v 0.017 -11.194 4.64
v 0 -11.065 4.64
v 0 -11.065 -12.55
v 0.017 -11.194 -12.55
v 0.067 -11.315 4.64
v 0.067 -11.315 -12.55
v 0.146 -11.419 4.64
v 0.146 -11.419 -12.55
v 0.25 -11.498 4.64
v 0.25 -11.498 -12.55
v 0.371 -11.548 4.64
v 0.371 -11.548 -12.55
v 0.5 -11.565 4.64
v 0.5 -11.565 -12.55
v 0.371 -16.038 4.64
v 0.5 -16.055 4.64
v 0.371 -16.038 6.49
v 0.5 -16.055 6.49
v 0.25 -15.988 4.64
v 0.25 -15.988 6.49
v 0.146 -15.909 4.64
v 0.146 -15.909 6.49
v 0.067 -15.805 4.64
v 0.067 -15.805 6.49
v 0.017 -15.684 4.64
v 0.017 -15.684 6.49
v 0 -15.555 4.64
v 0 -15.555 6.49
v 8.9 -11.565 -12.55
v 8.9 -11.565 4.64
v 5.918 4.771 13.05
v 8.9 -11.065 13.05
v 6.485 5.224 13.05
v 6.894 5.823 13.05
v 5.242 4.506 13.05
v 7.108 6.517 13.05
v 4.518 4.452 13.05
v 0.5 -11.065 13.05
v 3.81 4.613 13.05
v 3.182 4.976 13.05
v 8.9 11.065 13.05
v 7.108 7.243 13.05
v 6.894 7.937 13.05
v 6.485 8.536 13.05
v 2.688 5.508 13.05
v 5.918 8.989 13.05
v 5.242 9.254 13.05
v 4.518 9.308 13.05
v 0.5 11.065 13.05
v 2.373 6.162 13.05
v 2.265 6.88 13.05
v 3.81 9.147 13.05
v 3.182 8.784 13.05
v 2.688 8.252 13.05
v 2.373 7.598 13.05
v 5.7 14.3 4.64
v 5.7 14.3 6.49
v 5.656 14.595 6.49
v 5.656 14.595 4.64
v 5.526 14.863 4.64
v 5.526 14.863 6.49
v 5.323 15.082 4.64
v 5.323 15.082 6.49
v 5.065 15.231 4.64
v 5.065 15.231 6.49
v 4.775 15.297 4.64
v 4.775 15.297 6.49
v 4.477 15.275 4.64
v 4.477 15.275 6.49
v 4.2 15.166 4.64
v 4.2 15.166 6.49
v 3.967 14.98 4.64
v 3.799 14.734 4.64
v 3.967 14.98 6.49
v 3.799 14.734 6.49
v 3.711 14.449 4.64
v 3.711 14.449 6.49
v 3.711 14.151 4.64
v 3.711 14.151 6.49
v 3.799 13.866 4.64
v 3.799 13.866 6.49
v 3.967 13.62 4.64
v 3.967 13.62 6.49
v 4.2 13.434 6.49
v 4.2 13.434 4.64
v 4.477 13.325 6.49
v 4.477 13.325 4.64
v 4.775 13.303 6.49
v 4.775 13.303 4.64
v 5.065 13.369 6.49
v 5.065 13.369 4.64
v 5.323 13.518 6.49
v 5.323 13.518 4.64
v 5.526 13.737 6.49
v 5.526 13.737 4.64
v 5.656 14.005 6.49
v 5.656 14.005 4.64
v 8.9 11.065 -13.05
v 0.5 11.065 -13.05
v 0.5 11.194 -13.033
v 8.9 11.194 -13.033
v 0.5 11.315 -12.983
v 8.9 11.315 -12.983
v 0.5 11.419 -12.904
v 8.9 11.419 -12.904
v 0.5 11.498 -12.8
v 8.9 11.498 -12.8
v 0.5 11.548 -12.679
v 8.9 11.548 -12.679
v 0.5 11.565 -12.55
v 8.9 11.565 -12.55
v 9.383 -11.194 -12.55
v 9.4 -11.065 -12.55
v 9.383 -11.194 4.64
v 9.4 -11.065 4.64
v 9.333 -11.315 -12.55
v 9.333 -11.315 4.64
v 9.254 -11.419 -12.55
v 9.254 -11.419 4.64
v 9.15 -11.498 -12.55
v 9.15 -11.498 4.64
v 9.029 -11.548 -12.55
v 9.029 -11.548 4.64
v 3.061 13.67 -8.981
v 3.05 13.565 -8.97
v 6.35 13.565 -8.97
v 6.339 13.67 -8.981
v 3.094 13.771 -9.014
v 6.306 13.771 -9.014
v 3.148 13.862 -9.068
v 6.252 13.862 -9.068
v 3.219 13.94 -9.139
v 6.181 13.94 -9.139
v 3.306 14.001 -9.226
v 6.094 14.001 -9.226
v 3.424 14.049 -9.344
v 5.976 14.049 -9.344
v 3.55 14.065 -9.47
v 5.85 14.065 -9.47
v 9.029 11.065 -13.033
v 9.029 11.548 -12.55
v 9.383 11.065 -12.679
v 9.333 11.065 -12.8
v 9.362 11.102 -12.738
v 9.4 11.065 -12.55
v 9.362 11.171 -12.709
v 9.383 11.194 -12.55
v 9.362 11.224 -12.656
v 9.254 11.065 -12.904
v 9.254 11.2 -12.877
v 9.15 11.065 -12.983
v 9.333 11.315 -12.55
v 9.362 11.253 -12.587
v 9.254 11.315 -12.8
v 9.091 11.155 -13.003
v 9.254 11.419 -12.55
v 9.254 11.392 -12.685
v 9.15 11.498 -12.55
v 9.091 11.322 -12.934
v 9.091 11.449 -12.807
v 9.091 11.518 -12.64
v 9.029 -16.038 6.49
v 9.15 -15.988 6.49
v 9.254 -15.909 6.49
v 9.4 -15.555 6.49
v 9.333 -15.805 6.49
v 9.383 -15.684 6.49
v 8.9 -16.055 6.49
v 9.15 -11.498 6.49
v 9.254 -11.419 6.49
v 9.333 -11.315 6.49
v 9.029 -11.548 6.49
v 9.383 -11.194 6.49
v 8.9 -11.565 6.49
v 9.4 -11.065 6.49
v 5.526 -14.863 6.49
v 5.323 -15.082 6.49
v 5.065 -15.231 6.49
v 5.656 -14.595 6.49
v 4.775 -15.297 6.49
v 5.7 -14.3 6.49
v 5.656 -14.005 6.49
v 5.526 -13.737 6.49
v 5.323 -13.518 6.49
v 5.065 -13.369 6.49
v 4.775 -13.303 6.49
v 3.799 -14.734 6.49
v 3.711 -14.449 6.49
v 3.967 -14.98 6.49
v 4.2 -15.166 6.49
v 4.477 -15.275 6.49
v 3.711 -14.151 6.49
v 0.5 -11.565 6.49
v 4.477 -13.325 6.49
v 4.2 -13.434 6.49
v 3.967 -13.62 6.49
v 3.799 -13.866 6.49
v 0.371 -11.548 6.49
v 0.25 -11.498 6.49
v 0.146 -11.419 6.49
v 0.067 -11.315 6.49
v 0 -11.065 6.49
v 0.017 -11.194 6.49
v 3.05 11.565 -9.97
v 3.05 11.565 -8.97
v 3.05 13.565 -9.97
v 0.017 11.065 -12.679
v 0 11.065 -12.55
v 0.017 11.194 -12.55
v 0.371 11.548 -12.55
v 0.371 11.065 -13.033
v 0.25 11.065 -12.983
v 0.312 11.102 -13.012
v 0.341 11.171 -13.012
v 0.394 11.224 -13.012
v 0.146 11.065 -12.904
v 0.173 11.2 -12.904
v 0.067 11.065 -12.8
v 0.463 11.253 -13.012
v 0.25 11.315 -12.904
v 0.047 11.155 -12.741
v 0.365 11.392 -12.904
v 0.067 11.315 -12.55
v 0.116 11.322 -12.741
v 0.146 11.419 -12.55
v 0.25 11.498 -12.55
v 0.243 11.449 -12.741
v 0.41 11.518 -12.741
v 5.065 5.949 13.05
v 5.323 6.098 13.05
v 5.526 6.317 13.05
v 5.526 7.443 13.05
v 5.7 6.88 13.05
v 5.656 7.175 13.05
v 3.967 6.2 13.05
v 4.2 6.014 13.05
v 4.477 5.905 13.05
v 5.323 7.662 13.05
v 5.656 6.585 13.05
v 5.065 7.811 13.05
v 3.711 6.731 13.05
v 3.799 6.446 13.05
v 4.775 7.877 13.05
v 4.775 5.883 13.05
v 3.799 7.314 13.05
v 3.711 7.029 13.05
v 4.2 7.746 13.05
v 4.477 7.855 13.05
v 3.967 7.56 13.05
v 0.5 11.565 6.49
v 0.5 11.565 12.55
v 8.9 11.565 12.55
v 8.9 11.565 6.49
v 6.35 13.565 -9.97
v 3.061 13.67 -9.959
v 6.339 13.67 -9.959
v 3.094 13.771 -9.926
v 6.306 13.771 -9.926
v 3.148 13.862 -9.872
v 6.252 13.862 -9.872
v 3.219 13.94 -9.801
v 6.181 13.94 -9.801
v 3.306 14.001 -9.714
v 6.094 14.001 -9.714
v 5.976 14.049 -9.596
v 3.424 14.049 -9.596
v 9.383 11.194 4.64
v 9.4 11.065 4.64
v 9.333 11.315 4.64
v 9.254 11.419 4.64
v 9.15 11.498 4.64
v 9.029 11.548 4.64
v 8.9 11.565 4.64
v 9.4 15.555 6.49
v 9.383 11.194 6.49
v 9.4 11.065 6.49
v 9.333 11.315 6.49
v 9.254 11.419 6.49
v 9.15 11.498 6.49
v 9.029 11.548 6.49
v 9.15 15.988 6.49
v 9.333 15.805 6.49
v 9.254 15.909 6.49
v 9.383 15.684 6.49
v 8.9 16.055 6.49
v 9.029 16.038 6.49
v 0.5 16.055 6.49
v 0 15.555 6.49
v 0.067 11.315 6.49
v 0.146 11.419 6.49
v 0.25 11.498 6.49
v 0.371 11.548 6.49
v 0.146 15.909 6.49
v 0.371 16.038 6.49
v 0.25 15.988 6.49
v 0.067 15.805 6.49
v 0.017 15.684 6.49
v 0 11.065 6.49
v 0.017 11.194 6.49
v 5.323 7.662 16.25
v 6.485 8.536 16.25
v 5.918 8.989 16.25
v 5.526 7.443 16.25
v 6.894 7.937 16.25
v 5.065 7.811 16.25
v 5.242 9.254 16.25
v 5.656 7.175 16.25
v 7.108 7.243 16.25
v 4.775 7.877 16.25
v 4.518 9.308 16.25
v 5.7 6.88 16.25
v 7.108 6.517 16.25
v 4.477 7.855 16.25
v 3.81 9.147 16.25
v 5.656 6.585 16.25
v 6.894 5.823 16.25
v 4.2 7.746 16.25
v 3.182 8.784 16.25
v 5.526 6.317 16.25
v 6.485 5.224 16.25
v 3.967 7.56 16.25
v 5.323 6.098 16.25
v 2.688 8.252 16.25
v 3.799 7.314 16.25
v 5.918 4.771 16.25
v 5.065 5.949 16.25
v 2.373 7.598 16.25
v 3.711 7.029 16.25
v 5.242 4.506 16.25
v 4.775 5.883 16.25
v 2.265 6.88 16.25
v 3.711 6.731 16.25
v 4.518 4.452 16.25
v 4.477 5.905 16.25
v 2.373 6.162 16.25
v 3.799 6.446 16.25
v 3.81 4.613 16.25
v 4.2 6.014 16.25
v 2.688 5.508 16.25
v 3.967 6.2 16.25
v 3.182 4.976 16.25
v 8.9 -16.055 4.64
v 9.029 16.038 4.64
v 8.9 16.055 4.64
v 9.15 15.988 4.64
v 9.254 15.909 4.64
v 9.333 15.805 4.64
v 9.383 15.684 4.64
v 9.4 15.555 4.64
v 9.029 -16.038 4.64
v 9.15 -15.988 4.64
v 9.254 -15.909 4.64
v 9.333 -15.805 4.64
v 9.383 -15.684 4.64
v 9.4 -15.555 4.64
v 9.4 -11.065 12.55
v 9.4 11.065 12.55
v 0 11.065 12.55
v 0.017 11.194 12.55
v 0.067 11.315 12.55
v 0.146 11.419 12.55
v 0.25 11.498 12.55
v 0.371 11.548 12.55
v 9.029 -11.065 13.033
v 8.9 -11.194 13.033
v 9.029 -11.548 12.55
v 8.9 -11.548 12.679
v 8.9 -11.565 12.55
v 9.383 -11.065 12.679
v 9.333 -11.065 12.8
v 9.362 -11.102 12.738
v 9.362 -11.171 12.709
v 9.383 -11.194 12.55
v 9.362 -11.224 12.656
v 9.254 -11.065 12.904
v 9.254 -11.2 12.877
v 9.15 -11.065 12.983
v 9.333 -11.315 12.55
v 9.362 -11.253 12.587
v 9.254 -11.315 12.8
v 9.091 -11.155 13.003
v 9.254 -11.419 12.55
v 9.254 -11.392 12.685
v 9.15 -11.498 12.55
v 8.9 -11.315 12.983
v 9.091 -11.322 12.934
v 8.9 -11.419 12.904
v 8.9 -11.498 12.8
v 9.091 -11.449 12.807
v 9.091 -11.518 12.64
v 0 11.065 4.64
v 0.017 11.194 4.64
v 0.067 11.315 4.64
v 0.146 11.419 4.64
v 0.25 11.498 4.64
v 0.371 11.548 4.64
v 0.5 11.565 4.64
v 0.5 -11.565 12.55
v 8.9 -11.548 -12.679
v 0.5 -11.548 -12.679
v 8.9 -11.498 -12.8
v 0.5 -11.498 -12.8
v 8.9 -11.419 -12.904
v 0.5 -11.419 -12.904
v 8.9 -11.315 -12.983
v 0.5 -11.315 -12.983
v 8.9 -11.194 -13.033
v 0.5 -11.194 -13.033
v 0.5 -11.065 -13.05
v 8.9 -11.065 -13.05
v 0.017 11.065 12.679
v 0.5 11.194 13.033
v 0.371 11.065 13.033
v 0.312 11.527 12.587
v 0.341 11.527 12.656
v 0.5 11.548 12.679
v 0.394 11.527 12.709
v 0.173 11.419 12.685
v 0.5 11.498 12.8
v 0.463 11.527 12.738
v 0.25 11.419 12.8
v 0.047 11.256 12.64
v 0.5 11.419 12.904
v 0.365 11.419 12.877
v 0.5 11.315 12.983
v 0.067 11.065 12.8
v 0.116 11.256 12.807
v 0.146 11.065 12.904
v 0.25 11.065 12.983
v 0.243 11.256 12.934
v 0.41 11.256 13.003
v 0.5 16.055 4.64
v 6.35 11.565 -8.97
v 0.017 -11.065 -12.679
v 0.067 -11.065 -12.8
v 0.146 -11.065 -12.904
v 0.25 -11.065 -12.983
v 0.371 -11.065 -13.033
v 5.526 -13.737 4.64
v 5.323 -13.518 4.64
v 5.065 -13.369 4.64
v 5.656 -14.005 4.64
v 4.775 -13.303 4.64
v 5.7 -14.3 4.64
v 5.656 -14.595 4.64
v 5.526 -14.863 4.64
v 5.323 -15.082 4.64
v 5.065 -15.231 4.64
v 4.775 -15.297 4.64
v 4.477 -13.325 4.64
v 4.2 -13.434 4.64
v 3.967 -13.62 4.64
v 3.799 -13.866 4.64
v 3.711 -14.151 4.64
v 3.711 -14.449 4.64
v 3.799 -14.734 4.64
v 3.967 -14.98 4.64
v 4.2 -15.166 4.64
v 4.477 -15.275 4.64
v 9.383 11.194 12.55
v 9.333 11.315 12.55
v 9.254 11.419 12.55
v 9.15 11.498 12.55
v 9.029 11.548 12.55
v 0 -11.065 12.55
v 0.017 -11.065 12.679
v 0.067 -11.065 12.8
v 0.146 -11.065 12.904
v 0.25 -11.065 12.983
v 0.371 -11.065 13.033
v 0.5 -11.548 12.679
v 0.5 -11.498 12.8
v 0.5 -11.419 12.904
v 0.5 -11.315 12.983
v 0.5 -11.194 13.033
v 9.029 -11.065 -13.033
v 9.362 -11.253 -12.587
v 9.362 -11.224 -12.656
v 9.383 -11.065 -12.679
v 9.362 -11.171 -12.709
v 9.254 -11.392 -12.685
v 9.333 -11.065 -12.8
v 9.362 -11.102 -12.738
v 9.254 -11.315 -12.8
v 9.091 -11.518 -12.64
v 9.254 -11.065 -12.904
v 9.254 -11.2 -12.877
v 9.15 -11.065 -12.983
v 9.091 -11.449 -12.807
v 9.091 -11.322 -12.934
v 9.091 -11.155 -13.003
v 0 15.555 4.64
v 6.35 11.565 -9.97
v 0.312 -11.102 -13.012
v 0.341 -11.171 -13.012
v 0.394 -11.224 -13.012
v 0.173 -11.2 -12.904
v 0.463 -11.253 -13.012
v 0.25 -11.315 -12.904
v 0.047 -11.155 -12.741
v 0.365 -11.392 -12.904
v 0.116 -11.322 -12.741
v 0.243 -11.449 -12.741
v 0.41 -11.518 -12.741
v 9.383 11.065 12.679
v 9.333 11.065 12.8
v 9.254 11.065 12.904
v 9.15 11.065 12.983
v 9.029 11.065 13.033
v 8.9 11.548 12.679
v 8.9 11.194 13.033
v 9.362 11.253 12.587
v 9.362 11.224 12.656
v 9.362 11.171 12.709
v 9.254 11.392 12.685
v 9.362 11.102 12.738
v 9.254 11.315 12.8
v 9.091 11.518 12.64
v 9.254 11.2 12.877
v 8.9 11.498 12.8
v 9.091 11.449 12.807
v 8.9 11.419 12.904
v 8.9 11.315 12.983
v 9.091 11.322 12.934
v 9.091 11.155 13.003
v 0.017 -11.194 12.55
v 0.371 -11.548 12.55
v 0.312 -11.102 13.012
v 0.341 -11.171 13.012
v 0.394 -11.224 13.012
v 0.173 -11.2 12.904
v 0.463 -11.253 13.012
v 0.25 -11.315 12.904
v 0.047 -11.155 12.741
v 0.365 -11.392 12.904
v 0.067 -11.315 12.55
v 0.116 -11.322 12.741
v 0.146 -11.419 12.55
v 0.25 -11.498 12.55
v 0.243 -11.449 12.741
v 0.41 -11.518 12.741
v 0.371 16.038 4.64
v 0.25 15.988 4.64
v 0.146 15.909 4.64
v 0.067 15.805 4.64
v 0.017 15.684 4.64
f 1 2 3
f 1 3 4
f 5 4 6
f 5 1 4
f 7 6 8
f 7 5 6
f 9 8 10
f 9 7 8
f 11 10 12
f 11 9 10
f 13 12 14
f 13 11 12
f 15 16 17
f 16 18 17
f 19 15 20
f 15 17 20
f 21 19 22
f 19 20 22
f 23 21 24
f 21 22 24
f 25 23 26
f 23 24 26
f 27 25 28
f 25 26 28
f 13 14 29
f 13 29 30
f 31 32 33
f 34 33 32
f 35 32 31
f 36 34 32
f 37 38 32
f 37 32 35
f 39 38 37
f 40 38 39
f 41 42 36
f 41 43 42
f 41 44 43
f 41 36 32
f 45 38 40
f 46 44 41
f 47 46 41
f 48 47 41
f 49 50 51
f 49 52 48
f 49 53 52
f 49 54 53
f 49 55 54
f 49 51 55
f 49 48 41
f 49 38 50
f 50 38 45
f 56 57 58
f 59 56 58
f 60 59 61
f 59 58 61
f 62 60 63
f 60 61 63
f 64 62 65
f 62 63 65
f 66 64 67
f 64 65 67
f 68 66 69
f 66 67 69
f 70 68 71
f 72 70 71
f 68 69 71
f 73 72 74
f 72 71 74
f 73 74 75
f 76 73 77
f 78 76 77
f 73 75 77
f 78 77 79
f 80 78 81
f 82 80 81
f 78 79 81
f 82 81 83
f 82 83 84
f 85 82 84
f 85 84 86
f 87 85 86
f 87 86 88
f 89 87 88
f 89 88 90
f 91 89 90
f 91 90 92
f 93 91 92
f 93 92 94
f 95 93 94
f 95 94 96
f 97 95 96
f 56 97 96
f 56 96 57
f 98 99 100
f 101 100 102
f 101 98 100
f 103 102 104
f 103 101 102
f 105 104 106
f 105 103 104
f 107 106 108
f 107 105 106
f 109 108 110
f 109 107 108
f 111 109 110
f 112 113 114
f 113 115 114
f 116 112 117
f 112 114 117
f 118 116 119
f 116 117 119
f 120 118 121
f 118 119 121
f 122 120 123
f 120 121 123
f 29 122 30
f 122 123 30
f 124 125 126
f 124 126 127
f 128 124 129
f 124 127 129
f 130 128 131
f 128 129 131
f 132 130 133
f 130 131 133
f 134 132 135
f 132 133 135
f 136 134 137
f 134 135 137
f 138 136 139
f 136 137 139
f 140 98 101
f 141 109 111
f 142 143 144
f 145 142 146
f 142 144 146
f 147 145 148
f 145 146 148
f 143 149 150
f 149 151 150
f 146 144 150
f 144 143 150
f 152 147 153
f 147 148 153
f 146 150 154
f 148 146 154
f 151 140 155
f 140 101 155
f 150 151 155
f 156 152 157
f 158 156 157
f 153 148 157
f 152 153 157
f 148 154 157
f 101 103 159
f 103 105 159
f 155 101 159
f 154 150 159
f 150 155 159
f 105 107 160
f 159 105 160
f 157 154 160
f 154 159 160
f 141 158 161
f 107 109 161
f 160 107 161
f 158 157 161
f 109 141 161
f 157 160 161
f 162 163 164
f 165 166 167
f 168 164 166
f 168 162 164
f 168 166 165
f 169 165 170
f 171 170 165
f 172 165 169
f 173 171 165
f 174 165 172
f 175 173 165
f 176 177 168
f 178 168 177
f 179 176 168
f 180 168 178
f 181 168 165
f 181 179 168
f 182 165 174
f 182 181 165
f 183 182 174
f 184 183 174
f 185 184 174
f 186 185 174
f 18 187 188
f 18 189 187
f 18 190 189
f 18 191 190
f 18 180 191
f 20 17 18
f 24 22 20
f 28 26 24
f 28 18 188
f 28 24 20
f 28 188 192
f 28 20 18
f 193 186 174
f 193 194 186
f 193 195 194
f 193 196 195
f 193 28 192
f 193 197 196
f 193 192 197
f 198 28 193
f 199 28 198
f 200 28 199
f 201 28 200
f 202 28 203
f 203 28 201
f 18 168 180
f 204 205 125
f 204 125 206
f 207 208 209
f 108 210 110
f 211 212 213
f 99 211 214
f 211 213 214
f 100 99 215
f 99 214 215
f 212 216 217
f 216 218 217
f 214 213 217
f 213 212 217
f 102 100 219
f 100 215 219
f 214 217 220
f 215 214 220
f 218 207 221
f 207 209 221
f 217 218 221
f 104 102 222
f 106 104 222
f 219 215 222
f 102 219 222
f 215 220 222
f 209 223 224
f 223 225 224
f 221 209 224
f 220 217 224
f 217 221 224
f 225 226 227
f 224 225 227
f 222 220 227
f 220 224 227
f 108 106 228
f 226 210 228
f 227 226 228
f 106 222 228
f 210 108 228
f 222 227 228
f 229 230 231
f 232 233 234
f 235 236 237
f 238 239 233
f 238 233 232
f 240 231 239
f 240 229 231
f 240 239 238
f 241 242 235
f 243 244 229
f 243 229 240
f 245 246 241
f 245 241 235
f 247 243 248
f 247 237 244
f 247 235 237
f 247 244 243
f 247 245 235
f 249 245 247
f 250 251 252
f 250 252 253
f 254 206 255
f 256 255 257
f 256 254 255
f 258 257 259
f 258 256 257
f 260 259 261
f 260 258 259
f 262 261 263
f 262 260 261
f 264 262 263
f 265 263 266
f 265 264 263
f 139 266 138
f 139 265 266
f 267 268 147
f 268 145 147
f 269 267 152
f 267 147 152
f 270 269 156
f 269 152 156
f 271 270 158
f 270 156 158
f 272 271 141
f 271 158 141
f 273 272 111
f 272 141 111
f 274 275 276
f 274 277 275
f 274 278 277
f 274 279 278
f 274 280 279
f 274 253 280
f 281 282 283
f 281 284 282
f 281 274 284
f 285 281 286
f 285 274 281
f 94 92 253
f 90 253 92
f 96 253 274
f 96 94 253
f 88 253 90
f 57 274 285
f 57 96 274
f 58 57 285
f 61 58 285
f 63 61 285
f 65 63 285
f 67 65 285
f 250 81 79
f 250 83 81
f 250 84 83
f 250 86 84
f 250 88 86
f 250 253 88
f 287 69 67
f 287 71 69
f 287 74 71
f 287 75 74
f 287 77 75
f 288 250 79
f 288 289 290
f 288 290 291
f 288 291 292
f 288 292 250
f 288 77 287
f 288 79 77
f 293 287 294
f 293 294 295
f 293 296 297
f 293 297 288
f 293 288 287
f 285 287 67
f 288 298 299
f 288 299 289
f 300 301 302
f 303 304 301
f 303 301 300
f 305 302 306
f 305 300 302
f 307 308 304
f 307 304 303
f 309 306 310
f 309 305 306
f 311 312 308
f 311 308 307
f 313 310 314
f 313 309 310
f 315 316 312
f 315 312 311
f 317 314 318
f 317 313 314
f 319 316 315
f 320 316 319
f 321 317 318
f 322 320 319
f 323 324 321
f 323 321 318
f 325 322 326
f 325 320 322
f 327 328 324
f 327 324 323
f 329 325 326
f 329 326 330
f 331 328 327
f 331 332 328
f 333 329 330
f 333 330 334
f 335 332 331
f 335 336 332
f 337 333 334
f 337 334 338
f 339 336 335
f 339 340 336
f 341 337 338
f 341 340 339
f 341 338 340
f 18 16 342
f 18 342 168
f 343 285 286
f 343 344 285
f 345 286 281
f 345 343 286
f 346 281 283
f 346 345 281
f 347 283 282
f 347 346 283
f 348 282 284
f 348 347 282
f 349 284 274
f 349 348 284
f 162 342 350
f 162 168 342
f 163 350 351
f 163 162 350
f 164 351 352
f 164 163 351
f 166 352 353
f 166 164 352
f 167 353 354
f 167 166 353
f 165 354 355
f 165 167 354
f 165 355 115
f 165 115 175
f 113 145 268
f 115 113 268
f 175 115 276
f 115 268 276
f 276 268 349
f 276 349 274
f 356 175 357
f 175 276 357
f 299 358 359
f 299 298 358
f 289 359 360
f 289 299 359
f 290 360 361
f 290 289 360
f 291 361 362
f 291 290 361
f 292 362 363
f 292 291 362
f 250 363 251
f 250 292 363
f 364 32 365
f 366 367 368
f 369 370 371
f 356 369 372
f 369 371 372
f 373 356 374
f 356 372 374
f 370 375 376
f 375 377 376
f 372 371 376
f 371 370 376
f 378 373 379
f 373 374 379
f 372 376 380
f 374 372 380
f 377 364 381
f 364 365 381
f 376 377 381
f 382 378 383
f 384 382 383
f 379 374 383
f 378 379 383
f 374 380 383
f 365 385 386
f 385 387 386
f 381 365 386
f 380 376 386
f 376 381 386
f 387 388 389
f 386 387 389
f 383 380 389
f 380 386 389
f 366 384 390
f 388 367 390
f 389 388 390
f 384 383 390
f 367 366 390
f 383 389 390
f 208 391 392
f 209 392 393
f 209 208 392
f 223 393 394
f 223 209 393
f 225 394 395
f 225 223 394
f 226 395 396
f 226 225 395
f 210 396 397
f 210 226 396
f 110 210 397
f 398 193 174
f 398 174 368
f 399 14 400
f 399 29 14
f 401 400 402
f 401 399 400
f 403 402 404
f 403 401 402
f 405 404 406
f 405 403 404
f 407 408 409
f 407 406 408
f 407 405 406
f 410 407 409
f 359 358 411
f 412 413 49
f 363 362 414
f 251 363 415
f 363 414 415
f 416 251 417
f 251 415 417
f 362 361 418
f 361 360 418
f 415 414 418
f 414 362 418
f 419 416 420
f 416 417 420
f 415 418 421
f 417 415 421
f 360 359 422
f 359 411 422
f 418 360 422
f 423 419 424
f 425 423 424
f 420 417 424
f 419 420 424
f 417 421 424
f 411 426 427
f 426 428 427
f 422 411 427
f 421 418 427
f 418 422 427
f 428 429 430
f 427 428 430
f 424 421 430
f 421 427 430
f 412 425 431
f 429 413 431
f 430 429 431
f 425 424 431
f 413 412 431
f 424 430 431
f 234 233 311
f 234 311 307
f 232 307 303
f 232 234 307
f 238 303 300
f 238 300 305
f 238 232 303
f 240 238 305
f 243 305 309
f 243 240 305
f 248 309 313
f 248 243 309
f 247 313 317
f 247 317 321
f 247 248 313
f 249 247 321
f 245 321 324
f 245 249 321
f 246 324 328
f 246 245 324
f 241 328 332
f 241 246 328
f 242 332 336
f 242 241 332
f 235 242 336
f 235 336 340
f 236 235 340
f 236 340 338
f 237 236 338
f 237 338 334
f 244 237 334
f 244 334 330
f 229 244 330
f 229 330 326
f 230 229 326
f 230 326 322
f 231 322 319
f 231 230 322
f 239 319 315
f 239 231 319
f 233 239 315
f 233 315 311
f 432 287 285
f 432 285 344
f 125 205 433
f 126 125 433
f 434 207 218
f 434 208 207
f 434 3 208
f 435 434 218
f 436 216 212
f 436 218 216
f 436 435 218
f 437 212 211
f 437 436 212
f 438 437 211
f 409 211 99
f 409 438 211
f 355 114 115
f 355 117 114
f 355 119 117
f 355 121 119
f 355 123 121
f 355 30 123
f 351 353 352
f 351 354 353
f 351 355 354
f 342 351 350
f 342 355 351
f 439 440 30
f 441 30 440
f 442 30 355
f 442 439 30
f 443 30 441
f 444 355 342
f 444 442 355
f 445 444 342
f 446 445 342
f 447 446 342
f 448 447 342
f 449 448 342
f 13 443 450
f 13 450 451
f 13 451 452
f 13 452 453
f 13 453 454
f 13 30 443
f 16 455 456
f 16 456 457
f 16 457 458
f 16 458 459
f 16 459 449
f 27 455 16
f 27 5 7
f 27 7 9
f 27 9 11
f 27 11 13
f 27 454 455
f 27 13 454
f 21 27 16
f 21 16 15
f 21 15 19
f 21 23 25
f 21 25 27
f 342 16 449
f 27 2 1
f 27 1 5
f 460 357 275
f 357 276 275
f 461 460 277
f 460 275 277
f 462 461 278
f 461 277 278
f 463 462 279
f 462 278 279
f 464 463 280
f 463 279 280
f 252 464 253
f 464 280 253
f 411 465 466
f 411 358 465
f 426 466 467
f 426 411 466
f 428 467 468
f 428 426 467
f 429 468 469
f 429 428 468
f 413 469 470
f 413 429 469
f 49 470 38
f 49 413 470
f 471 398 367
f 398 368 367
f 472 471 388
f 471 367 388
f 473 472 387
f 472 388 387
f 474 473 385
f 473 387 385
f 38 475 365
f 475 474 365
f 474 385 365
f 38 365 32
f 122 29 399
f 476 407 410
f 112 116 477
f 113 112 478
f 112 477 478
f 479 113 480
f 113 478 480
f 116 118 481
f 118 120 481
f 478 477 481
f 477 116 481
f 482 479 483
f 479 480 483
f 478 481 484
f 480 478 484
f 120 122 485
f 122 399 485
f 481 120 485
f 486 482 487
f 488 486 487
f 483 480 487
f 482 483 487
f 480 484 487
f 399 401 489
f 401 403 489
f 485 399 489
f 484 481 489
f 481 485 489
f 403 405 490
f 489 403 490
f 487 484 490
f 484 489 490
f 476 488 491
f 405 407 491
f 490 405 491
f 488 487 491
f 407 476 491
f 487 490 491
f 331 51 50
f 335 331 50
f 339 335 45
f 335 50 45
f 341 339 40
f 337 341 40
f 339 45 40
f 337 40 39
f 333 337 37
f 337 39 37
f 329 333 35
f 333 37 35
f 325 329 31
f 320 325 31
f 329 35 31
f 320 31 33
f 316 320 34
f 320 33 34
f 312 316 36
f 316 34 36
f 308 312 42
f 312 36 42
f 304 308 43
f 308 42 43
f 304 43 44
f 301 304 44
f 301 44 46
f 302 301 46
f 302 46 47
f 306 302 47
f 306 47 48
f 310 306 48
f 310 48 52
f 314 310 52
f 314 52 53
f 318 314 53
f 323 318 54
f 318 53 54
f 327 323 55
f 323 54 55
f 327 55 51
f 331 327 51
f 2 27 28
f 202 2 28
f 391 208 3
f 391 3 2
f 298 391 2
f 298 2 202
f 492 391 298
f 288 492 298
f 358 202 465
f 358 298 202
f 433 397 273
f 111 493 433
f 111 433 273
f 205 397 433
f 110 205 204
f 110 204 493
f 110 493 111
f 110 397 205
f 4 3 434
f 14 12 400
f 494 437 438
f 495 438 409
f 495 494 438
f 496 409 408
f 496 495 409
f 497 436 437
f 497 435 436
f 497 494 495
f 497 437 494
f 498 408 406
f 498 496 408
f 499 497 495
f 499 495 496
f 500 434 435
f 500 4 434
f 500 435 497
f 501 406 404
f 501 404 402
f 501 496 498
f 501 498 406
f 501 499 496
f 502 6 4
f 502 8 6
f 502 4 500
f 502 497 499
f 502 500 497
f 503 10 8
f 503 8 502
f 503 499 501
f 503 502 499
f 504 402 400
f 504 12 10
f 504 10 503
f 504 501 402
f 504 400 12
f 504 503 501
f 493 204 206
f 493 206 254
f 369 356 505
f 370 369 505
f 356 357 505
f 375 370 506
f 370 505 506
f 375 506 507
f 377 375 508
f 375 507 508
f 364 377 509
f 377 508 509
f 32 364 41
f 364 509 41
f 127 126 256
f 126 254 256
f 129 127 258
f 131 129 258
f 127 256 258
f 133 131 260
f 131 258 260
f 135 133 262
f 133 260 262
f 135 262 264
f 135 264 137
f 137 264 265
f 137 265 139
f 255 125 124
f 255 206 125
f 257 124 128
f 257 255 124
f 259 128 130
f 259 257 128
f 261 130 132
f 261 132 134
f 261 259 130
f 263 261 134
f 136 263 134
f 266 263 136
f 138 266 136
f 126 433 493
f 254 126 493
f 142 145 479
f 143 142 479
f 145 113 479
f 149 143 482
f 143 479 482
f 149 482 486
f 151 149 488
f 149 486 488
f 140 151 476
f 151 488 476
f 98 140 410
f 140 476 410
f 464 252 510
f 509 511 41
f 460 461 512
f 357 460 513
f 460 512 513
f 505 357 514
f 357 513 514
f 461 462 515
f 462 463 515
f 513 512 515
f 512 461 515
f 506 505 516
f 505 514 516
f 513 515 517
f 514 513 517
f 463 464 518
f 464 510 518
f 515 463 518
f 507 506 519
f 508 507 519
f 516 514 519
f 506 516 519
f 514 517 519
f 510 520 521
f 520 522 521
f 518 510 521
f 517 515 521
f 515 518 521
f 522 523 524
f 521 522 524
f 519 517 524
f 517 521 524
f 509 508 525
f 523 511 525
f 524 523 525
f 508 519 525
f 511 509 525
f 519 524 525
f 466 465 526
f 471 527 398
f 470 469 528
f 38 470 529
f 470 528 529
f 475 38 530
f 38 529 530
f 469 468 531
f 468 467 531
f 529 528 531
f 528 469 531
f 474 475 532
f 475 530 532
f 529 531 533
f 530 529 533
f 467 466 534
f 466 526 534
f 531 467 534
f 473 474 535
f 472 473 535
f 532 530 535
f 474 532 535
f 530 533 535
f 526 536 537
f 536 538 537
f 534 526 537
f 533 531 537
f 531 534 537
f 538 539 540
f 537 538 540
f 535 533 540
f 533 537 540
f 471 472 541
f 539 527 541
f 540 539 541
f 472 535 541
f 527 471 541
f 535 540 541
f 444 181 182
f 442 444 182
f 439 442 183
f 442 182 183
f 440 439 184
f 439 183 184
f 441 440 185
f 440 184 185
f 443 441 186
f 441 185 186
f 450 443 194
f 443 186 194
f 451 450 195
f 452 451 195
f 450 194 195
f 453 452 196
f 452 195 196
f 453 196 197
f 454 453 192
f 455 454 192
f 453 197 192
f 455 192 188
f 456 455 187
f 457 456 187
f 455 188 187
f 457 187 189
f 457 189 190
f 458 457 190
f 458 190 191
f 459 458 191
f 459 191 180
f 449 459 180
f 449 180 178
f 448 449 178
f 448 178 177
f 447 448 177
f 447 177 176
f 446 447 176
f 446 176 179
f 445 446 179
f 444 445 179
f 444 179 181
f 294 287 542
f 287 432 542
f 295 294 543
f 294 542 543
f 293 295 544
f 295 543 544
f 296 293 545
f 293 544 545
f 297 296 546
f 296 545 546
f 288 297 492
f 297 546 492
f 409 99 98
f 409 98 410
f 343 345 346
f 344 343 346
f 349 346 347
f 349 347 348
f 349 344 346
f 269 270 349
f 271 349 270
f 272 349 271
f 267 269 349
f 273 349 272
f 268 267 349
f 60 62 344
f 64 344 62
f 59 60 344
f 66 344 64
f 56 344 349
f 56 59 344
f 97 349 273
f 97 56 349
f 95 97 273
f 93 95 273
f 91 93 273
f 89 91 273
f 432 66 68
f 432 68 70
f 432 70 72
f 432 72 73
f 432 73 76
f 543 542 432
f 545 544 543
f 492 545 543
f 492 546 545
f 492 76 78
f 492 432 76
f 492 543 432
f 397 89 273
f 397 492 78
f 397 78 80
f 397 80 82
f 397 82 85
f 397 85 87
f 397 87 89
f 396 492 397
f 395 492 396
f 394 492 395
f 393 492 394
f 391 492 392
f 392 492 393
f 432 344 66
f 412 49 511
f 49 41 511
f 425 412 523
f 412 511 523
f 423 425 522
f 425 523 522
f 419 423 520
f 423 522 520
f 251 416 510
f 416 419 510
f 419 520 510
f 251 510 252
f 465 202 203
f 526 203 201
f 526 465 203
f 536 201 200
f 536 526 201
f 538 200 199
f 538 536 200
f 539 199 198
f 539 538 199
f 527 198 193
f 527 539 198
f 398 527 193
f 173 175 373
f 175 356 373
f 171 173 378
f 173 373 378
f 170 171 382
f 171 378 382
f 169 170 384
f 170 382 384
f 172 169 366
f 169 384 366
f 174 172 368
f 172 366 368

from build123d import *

# Parameters (mm, degrees)
BOSS_EXTRUDE1_DEPTH = 9.4
FILLET1_R           = 0.5
FILLET2_R           = 0.5
SKETCH2_R           = 1
CUT_EXTRUDE1_DEPTH  = 27.98026362
SKETCH3_W           = 3.3
SKETCH3_H           = 1
BOSS_EXTRUDE2_DEPTH = 2.5
FILLET3_R           = 0.5
SKETCH4_R           = 2.435
SKETCH4_R_2         = 1
BOSS_EXTRUDE3_DEPTH = 3.2


with BuildPart() as part:
    # Sketch1 → Boss-Extrude1 (new body)
    with BuildSketch(Plane(origin=(0, 0, 0), x_dir=(0, 0, -1), z_dir=(1, 0, 0))):
        Polygon((-4.64, 11.565), (13.05, 11.565), (13.05, -11.565), (-4.64, -11.565), (-4.64, -16.055), (-6.49, -16.055), (-6.49, -11.565), (-13.05, -11.565), (-13.05, 11.565), (-6.49, 11.565), (-6.49, 16.055), (-4.64, 16.055), align=None)
    extrude(amount=BOSS_EXTRUDE1_DEPTH)

    # Fillet1
    fillet1_edges = [part.edges().sort_by_distance(p)[0] for p in [
        (0, -16.055, 5.565),
        (0, 16.055, 5.565),
        (9.4, 16.055, 5.565),
        (9.4, -16.055, 5.565),
    ]]
    fillet(fillet1_edges, radius=FILLET1_R)

    # Fillet2
    fillet2_edges = [part.edges().sort_by_distance(p)[0] for p in [
        (0, -11.565, -4.205),
        (0, -11.565, 9.77),
        (0, 0, 13.05),
        (0, 11.565, 9.77),
        (0, 11.565, -4.205),
        (0, 0, -13.05),
        (4.7, -11.565, -13.05),
        (4.7, -11.565, 13.05),
        (4.7, 11.565, 13.05),
        (4.7, 11.565, -13.05),
        (9.4, 11.565, 9.77),
        (9.4, 0, 13.05),
        (9.4, -11.565, 9.77),
        (9.4, -11.565, -4.205),
        (9.4, 0, -13.05),
        (9.4, 11.565, -4.205),
    ]]
    fillet(fillet2_edges, radius=FILLET2_R)

    # Sketch2 → Cut-Extrude1 (cut, through all)
    with BuildSketch(Plane.XY.offset(6.49)):
        with Locations((4.7, -14.3)):
            Circle(SKETCH2_R)
        with Locations((4.7, 14.3)):
            Circle(SKETCH2_R)
    extrude(amount=-CUT_EXTRUDE1_DEPTH, mode=Mode.SUBTRACT)

    # Sketch3 → Boss-Extrude2 (add)
    with BuildSketch(Plane(origin=(0, 11.565, 0), x_dir=(1, 0, 0), z_dir=(0, 1, 0))):
        with Locations((4.7, 9.470007)):
            Rectangle(SKETCH3_W, SKETCH3_H)
    extrude(amount=BOSS_EXTRUDE2_DEPTH)

    # Fillet3
    fillet3_edges = [part.edges().sort_by_distance(p)[0] for p in [
        (3.05, 14.065, -9.470007),
        (4.7, 14.065, -8.970007),
        (6.35, 14.065, -9.470007),
        (4.7, 14.065, -9.970007),
    ]]
    fillet(fillet3_edges, radius=FILLET3_R - 0.0001)  # a hair under: the kernel refuses the full size

    # Sketch4 → Boss-Extrude3 (add)
    with BuildSketch(Plane.XY.offset(13.05)):
        with Locations(Location((4.7, 6.88, 0), (0, 0, 180))):
            Circle(SKETCH4_R)
        with Locations((4.7, 6.88)):
            Circle(SKETCH4_R_2, mode=Mode.SUBTRACT)
    extrude(amount=BOSS_EXTRUDE3_DEPTH)


solid = part.part
